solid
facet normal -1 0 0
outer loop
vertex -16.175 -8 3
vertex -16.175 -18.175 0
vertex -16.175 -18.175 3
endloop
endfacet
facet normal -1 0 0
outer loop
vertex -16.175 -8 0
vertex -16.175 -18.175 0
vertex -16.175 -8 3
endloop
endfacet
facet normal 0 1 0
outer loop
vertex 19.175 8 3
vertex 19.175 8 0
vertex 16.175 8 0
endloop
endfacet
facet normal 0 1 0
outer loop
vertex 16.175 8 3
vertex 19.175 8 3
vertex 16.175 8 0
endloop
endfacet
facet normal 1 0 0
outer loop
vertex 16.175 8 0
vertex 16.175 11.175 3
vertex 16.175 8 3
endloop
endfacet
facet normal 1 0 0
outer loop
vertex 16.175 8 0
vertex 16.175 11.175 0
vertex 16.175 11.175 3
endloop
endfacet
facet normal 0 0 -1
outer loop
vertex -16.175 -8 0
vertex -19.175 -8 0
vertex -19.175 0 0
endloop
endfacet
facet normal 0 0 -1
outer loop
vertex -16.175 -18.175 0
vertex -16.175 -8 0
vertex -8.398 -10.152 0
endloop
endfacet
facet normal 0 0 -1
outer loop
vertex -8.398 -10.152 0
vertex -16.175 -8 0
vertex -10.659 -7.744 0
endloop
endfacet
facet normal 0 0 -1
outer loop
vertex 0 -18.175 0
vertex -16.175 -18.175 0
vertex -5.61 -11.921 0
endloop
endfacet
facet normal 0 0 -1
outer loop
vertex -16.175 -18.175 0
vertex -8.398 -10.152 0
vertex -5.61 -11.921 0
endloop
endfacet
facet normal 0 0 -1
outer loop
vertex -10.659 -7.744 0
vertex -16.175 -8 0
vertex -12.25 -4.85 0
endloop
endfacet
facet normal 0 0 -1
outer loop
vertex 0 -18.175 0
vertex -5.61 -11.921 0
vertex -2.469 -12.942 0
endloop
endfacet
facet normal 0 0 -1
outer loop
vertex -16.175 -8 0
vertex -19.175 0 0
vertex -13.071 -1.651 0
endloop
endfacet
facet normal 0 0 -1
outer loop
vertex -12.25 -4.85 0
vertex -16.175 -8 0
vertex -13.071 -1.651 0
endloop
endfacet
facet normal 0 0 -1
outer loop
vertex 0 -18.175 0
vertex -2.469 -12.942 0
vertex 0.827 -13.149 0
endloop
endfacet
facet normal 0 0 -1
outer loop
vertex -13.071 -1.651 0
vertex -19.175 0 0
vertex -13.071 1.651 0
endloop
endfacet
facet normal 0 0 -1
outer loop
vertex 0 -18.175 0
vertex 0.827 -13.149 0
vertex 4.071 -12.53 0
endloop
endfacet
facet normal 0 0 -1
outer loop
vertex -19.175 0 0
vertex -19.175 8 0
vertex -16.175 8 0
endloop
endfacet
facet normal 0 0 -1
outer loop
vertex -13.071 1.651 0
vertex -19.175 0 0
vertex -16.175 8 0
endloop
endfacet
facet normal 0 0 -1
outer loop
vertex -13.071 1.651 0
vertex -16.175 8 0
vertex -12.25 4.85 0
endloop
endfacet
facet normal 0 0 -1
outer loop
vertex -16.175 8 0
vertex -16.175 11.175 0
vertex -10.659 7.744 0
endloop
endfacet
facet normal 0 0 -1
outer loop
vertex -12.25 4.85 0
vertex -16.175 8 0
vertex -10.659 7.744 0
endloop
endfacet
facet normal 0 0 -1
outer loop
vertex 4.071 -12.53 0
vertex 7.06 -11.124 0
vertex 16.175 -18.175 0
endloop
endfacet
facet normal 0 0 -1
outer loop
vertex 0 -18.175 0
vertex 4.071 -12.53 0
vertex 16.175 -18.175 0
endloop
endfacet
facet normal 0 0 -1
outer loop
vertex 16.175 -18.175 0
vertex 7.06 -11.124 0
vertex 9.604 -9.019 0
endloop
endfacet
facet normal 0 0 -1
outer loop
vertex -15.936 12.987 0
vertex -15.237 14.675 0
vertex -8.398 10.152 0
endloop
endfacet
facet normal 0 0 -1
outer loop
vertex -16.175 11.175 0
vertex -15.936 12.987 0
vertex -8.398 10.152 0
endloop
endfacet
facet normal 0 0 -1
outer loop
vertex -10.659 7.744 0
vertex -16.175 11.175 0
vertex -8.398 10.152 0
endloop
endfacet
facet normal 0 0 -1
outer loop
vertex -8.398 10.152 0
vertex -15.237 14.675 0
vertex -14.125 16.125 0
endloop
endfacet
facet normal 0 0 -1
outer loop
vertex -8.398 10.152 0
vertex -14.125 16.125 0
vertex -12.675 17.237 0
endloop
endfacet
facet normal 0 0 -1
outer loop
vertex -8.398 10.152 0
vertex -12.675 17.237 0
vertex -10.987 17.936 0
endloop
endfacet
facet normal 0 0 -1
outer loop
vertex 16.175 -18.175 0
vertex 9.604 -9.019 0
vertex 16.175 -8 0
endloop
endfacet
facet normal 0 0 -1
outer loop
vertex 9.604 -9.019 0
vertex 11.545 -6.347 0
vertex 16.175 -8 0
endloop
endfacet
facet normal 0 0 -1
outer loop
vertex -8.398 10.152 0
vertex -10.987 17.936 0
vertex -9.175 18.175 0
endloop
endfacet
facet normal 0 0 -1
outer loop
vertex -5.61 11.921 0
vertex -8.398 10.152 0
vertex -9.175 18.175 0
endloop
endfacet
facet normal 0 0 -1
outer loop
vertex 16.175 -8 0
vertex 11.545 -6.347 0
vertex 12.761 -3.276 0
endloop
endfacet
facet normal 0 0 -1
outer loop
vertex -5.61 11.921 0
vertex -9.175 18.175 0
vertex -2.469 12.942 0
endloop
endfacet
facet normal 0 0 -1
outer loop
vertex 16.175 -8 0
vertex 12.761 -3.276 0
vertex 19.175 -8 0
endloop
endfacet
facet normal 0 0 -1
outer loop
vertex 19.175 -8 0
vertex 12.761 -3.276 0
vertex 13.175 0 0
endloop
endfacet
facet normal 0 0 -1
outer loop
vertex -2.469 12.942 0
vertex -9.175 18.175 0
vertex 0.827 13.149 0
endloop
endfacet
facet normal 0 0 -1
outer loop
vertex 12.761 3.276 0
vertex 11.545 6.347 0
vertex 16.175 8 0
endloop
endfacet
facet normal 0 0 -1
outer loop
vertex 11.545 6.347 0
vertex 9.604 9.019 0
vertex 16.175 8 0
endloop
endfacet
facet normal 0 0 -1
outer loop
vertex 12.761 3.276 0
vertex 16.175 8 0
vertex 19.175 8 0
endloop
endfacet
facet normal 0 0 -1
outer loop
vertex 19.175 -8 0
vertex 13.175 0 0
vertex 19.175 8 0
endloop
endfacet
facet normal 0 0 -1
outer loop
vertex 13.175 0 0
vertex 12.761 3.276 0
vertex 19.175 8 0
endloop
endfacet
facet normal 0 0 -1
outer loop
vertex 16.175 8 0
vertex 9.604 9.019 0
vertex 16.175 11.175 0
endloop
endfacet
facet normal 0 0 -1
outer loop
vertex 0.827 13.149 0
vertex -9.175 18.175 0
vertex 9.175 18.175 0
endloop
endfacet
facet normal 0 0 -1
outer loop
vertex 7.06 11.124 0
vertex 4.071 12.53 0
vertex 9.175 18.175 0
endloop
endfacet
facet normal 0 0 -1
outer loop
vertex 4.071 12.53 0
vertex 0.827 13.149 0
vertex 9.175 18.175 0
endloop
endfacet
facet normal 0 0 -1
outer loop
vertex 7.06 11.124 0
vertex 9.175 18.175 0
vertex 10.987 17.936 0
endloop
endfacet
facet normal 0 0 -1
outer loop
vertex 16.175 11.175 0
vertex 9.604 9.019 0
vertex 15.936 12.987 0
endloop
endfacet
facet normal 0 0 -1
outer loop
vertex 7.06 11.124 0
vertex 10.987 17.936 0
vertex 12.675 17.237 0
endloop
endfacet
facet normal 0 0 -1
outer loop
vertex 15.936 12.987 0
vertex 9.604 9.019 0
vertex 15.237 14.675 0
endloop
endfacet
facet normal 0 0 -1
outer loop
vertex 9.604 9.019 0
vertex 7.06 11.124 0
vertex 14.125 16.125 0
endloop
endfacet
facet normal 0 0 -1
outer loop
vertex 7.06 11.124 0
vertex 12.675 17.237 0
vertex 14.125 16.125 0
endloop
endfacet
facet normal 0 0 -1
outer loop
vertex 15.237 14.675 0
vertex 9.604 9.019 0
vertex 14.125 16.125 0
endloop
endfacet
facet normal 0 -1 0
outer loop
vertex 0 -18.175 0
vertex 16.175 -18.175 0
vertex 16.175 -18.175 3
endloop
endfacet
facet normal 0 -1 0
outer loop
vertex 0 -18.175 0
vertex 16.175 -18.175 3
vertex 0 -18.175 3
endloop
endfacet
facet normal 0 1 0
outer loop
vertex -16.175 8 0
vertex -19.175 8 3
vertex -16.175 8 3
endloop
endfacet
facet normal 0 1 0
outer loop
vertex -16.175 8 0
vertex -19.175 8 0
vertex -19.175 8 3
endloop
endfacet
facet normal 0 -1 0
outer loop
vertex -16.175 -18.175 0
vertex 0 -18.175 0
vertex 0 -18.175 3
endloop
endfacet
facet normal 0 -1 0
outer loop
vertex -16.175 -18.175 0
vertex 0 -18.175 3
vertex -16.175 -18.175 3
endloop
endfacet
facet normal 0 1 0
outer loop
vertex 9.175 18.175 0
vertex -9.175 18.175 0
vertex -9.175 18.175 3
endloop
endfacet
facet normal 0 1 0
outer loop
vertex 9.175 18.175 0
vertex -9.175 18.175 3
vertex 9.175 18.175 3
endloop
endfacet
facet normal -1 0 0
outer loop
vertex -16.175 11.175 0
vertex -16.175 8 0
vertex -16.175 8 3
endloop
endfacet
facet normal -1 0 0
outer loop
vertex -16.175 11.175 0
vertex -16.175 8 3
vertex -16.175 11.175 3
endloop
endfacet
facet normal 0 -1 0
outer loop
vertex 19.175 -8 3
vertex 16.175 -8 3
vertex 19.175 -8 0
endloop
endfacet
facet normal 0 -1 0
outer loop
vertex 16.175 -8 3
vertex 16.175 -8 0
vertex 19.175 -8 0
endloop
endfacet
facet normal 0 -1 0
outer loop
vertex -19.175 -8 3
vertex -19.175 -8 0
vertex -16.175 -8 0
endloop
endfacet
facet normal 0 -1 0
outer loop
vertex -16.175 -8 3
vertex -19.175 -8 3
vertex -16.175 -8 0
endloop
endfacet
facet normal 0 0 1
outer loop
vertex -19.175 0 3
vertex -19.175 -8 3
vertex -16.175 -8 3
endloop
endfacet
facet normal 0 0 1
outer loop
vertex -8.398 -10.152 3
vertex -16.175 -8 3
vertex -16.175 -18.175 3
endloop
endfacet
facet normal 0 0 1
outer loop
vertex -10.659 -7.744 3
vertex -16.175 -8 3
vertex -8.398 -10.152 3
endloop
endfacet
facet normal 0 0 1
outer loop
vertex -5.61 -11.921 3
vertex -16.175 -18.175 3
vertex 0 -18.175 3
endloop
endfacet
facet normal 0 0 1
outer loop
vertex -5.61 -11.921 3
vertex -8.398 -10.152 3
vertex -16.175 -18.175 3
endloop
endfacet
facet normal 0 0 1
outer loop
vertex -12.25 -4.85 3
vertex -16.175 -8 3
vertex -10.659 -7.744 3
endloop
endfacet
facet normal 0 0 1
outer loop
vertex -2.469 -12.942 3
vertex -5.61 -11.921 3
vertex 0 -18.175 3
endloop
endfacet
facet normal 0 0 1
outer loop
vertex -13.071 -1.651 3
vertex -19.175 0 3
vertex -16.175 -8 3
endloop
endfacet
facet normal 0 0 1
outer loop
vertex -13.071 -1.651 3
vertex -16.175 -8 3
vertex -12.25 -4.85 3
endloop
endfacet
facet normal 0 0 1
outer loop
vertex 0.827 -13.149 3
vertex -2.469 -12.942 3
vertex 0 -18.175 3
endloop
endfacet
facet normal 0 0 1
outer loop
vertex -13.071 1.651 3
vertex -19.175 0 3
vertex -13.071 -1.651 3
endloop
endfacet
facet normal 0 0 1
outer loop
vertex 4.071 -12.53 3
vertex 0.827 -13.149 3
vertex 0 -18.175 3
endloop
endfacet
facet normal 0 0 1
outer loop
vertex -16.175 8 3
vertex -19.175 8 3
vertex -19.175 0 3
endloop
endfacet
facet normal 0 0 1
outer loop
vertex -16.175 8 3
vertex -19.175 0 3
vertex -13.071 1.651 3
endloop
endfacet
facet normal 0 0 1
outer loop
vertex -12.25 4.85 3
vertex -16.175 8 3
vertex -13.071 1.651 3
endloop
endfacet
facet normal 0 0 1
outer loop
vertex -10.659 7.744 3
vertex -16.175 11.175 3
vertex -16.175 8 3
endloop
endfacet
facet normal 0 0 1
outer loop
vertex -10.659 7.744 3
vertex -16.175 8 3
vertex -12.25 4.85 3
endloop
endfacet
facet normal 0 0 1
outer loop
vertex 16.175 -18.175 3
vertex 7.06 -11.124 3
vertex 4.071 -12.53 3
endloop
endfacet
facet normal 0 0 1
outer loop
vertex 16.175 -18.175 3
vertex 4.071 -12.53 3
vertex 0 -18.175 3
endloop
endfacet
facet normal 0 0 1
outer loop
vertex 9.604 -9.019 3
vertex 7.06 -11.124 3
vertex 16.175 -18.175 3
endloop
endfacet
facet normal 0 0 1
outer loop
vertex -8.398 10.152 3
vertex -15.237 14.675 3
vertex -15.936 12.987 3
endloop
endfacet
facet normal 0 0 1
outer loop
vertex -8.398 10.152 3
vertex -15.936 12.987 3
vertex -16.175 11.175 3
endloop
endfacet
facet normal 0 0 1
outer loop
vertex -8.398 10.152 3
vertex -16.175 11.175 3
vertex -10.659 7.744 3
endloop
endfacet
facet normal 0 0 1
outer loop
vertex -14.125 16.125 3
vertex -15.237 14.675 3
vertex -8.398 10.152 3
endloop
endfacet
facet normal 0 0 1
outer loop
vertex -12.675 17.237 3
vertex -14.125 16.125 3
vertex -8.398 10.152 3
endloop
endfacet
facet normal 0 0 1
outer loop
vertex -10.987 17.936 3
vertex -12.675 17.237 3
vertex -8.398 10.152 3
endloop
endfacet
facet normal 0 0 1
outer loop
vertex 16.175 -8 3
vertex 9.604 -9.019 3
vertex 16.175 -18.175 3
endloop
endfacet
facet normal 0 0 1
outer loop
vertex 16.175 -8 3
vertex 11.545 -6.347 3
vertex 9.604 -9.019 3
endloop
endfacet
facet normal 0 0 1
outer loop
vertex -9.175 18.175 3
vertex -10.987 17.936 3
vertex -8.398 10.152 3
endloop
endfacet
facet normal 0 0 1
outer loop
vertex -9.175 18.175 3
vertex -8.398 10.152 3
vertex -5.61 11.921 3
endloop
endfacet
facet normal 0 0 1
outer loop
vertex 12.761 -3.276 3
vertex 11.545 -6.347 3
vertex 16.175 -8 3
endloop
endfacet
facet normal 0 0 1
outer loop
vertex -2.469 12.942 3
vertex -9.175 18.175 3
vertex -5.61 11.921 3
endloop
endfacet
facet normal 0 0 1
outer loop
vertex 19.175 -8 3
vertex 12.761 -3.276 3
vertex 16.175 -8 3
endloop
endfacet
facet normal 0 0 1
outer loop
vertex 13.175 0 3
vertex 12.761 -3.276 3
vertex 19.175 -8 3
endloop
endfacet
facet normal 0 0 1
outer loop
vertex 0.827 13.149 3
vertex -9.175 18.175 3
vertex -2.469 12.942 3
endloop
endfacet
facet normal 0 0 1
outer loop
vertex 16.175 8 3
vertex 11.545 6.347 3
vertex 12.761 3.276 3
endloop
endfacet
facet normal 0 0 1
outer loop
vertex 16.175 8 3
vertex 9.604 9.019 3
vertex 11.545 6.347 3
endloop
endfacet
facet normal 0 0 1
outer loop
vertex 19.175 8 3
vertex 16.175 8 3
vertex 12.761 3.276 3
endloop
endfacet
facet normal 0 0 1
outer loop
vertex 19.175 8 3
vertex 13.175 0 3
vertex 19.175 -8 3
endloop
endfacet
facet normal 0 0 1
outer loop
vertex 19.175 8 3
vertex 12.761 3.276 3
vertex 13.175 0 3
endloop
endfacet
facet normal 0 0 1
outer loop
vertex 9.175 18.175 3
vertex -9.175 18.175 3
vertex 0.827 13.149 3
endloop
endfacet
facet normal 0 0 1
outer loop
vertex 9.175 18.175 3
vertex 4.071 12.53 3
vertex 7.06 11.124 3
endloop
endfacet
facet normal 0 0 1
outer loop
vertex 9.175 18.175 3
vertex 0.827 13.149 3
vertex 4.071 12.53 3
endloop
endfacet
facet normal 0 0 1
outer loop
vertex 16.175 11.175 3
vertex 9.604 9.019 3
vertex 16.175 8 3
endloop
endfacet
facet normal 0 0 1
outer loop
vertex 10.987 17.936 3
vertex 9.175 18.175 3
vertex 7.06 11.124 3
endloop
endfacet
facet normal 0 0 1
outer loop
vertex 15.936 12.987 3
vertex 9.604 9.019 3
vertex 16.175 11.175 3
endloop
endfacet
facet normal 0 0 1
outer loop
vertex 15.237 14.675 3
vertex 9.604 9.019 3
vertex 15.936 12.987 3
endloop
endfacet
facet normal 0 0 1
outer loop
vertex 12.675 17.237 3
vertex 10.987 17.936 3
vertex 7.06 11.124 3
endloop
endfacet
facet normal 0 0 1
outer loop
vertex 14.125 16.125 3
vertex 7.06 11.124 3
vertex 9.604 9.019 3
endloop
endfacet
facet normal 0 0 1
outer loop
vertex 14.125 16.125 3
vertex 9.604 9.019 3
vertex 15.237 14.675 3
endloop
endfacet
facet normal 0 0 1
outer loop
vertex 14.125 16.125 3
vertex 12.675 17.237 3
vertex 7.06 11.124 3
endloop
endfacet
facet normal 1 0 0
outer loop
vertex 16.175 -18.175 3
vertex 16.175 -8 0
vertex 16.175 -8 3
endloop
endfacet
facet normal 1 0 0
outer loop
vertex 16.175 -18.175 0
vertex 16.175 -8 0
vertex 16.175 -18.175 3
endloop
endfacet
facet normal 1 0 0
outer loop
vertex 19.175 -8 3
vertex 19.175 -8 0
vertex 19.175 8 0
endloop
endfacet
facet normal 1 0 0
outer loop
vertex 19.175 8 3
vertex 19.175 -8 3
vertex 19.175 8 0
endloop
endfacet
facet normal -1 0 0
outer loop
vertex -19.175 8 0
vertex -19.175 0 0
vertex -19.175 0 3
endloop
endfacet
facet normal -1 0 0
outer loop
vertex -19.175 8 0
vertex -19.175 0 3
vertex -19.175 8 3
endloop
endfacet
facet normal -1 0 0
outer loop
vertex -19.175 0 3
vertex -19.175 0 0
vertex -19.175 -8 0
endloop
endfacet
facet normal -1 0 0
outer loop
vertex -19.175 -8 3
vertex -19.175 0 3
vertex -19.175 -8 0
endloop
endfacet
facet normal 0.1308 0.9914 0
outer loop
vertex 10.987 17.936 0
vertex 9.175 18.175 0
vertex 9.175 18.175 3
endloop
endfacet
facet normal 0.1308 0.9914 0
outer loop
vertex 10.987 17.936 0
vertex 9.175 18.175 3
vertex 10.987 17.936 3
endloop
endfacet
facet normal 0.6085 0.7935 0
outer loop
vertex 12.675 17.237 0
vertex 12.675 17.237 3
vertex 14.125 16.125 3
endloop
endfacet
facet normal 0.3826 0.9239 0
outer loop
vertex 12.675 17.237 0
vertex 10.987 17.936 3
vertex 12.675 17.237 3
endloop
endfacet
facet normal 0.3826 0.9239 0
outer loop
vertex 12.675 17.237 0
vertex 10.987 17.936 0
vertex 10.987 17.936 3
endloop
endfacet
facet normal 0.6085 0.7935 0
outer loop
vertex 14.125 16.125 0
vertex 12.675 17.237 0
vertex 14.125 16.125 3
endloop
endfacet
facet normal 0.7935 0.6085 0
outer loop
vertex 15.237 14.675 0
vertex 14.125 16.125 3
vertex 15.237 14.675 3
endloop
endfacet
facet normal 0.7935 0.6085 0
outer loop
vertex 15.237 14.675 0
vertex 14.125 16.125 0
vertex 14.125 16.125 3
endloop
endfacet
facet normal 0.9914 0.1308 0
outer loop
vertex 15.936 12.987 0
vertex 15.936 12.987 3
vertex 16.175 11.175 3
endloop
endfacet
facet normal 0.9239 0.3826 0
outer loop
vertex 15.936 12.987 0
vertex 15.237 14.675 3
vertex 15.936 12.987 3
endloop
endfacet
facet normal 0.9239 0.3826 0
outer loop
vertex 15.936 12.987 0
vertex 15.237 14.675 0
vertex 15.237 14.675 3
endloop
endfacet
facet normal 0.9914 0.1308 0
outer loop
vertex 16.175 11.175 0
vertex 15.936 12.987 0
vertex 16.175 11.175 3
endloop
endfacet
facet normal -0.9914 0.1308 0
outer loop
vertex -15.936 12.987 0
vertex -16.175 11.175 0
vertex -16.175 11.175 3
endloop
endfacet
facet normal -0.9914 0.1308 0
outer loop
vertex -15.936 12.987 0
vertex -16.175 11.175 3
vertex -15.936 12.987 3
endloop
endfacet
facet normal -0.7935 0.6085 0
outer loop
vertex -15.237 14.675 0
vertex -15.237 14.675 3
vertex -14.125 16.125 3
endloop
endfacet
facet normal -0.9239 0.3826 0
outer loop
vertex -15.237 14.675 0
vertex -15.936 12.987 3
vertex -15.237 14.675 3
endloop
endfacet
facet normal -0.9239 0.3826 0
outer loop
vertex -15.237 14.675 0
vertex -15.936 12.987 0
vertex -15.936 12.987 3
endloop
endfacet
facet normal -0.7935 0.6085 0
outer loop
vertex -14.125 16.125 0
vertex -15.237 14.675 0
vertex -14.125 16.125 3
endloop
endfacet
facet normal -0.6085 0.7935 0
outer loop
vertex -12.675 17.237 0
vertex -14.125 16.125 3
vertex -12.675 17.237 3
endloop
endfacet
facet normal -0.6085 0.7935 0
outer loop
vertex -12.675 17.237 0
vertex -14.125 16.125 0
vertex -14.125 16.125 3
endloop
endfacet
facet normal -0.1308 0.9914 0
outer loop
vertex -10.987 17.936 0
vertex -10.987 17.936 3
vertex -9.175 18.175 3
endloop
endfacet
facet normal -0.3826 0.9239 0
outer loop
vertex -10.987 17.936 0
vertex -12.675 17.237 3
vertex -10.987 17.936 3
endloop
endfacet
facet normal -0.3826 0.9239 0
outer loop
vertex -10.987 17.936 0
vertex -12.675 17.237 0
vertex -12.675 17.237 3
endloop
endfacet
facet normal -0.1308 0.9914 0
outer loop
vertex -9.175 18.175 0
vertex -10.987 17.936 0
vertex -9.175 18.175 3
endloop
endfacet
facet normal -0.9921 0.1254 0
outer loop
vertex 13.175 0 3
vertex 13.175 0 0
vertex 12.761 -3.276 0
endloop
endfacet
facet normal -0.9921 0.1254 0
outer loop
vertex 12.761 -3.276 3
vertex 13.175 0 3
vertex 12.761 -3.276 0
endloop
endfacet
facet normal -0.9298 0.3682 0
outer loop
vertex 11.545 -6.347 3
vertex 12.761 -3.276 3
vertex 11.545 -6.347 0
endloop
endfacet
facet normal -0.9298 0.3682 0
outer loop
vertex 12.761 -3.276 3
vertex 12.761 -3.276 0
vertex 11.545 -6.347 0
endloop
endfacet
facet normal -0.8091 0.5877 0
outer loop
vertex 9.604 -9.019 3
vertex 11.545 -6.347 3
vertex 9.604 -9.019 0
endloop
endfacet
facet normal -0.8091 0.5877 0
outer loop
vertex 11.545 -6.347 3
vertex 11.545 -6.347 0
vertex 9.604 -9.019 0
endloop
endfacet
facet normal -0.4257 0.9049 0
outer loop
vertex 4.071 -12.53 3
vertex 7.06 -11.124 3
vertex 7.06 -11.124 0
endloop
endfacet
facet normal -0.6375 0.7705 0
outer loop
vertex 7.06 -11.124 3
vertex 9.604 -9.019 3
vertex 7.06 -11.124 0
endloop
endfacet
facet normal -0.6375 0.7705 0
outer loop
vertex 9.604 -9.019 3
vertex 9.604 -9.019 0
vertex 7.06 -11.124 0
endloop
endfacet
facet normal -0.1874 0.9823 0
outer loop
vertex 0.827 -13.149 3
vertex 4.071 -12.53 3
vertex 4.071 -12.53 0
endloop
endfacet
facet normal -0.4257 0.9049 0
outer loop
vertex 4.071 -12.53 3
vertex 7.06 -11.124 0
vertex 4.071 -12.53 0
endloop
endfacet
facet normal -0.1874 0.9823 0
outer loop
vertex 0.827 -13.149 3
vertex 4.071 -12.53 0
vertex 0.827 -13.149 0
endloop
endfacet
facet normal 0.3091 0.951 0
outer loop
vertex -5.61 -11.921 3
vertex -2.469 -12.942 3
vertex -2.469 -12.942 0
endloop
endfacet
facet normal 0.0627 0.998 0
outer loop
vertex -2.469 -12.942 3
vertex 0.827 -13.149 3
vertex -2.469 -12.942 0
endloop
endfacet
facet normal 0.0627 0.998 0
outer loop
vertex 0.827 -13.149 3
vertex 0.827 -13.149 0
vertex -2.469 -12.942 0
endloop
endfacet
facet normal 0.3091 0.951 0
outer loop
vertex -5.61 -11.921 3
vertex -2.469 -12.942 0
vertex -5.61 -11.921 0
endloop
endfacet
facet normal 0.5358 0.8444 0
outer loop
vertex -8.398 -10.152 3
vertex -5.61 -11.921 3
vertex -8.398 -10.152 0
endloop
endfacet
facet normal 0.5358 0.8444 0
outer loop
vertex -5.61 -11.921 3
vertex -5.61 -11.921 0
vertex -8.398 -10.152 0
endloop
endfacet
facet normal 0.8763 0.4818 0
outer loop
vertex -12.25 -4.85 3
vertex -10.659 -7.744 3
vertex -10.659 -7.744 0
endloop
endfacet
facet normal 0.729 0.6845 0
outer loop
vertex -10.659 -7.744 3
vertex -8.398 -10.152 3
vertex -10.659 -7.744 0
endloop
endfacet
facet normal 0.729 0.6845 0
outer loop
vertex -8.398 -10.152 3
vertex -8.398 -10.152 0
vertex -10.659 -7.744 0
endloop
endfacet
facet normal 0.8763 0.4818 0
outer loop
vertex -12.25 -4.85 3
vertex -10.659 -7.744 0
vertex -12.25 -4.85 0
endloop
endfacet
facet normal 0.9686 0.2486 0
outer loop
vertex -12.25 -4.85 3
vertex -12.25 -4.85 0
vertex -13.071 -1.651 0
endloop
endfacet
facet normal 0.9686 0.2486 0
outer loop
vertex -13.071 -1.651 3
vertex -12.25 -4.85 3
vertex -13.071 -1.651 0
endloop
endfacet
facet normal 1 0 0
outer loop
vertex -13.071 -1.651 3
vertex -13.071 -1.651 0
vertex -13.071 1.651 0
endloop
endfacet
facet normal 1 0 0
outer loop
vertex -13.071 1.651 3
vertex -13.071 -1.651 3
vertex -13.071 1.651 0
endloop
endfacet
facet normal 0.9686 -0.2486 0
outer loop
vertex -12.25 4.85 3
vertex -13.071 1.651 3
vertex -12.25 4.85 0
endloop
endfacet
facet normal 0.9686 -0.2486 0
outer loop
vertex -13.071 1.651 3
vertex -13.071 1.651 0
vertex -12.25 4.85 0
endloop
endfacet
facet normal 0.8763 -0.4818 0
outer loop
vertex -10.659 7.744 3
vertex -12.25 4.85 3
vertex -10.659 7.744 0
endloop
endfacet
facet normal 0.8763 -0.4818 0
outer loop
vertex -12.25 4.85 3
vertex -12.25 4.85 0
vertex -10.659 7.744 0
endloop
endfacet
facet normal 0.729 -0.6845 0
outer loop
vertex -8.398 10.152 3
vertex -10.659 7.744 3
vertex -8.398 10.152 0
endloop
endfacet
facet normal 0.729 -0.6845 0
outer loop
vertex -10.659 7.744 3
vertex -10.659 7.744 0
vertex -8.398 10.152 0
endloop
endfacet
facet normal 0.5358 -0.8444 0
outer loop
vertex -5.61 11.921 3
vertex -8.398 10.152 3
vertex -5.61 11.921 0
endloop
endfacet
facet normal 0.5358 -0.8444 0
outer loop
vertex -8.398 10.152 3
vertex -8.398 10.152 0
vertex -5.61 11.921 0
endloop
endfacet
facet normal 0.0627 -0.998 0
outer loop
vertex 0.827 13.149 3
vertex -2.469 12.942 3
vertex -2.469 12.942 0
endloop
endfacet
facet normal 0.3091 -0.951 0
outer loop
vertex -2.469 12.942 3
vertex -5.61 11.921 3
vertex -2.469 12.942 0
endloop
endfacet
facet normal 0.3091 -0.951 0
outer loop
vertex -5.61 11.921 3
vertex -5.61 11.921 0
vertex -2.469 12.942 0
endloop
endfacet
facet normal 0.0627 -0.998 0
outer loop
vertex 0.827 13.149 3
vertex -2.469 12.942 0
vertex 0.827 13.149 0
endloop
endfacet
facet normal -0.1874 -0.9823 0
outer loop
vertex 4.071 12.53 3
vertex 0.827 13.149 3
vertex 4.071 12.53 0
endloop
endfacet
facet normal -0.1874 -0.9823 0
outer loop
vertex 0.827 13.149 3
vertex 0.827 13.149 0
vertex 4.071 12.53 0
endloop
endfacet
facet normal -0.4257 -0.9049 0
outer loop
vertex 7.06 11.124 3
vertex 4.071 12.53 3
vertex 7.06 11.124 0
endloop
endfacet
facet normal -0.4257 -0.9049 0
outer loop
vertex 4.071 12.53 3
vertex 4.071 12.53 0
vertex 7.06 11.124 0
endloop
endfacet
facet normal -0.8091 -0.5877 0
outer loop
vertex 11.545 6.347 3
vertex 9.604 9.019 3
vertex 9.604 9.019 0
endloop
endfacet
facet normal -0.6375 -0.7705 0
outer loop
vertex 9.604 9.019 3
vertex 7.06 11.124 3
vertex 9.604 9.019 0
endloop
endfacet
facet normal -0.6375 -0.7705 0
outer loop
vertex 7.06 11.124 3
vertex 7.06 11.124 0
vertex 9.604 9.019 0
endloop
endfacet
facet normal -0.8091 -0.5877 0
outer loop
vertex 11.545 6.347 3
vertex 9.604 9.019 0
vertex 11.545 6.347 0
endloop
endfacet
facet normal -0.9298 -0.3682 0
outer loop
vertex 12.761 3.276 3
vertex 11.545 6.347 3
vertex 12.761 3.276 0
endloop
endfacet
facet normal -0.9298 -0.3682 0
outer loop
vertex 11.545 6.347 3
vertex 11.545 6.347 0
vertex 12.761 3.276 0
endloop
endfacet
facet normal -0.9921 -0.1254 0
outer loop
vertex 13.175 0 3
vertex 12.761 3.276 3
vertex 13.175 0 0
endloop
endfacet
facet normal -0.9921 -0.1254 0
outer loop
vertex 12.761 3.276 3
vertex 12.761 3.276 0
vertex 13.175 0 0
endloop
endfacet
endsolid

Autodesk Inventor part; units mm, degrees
ref_plane "YZ Plane" through (0, 0, 0) normal (1, 0, 0) x (0, 1, 0)
ref_plane "XZ Plane" through (0, 0, 0) normal (0, 1, 0) x (-1, 0, 0)
ref_plane "XY Plane" through (0, 0, 0) normal (0, 0, 1) x (1, 0, 0)
sketch "Boceto1" plane through (0, 0, 0) normal (0, 0, 1) x (1, 0, 0)
  circle A0 centre (0, 0) radius 13.175
  line L0 (0, -18.175) -> (-16.175, -18.175)
  line L1 (-9.175, 18.175) -> (9.175, 18.175)
  line L2 (16.175, -18.175) -> (0, -18.175)
  line L3 (-19.175, 0) -> (-19.175, 8)
  line L4 (-19.175, 8) -> (-16.175, 8)
  line L5 (-19.175, 0) -> (-19.175, -8)
  line L6 (-19.175, -8) -> (-16.175, -8)
  line L7 (-16.175, -18.175) -> (-16.175, -8)
  line L8 (-16.175, 8) -> (-16.175, 11.175)
  line L9 (16.175, -8) -> (19.175, -8)
  line L10 (19.175, -8) -> (19.175, 8)
  line L11 (19.175, 8) -> (16.175, 8)
  line L12 (16.175, 11.175) -> (16.175, 8)
  line L13 (16.175, -8) -> (16.175, -18.175)
  arc A1 (-9.175, 18.175) -> (-16.175, 11.175) centre (-9.175, 11.175) ccw
  arc A2 (16.175, 11.175) -> (9.175, 18.175) centre (9.175, 11.175) ccw
  dimension "d12" = 7
  dimension "d15" = 32.35
  dimension "d16" = 29.35
  dimension "d17" = 8
  dimension "d18" = 10.175
extrude "Extrusión1" add sketch "Boceto1" along normal blind 3
properties part number "muñeca3"
